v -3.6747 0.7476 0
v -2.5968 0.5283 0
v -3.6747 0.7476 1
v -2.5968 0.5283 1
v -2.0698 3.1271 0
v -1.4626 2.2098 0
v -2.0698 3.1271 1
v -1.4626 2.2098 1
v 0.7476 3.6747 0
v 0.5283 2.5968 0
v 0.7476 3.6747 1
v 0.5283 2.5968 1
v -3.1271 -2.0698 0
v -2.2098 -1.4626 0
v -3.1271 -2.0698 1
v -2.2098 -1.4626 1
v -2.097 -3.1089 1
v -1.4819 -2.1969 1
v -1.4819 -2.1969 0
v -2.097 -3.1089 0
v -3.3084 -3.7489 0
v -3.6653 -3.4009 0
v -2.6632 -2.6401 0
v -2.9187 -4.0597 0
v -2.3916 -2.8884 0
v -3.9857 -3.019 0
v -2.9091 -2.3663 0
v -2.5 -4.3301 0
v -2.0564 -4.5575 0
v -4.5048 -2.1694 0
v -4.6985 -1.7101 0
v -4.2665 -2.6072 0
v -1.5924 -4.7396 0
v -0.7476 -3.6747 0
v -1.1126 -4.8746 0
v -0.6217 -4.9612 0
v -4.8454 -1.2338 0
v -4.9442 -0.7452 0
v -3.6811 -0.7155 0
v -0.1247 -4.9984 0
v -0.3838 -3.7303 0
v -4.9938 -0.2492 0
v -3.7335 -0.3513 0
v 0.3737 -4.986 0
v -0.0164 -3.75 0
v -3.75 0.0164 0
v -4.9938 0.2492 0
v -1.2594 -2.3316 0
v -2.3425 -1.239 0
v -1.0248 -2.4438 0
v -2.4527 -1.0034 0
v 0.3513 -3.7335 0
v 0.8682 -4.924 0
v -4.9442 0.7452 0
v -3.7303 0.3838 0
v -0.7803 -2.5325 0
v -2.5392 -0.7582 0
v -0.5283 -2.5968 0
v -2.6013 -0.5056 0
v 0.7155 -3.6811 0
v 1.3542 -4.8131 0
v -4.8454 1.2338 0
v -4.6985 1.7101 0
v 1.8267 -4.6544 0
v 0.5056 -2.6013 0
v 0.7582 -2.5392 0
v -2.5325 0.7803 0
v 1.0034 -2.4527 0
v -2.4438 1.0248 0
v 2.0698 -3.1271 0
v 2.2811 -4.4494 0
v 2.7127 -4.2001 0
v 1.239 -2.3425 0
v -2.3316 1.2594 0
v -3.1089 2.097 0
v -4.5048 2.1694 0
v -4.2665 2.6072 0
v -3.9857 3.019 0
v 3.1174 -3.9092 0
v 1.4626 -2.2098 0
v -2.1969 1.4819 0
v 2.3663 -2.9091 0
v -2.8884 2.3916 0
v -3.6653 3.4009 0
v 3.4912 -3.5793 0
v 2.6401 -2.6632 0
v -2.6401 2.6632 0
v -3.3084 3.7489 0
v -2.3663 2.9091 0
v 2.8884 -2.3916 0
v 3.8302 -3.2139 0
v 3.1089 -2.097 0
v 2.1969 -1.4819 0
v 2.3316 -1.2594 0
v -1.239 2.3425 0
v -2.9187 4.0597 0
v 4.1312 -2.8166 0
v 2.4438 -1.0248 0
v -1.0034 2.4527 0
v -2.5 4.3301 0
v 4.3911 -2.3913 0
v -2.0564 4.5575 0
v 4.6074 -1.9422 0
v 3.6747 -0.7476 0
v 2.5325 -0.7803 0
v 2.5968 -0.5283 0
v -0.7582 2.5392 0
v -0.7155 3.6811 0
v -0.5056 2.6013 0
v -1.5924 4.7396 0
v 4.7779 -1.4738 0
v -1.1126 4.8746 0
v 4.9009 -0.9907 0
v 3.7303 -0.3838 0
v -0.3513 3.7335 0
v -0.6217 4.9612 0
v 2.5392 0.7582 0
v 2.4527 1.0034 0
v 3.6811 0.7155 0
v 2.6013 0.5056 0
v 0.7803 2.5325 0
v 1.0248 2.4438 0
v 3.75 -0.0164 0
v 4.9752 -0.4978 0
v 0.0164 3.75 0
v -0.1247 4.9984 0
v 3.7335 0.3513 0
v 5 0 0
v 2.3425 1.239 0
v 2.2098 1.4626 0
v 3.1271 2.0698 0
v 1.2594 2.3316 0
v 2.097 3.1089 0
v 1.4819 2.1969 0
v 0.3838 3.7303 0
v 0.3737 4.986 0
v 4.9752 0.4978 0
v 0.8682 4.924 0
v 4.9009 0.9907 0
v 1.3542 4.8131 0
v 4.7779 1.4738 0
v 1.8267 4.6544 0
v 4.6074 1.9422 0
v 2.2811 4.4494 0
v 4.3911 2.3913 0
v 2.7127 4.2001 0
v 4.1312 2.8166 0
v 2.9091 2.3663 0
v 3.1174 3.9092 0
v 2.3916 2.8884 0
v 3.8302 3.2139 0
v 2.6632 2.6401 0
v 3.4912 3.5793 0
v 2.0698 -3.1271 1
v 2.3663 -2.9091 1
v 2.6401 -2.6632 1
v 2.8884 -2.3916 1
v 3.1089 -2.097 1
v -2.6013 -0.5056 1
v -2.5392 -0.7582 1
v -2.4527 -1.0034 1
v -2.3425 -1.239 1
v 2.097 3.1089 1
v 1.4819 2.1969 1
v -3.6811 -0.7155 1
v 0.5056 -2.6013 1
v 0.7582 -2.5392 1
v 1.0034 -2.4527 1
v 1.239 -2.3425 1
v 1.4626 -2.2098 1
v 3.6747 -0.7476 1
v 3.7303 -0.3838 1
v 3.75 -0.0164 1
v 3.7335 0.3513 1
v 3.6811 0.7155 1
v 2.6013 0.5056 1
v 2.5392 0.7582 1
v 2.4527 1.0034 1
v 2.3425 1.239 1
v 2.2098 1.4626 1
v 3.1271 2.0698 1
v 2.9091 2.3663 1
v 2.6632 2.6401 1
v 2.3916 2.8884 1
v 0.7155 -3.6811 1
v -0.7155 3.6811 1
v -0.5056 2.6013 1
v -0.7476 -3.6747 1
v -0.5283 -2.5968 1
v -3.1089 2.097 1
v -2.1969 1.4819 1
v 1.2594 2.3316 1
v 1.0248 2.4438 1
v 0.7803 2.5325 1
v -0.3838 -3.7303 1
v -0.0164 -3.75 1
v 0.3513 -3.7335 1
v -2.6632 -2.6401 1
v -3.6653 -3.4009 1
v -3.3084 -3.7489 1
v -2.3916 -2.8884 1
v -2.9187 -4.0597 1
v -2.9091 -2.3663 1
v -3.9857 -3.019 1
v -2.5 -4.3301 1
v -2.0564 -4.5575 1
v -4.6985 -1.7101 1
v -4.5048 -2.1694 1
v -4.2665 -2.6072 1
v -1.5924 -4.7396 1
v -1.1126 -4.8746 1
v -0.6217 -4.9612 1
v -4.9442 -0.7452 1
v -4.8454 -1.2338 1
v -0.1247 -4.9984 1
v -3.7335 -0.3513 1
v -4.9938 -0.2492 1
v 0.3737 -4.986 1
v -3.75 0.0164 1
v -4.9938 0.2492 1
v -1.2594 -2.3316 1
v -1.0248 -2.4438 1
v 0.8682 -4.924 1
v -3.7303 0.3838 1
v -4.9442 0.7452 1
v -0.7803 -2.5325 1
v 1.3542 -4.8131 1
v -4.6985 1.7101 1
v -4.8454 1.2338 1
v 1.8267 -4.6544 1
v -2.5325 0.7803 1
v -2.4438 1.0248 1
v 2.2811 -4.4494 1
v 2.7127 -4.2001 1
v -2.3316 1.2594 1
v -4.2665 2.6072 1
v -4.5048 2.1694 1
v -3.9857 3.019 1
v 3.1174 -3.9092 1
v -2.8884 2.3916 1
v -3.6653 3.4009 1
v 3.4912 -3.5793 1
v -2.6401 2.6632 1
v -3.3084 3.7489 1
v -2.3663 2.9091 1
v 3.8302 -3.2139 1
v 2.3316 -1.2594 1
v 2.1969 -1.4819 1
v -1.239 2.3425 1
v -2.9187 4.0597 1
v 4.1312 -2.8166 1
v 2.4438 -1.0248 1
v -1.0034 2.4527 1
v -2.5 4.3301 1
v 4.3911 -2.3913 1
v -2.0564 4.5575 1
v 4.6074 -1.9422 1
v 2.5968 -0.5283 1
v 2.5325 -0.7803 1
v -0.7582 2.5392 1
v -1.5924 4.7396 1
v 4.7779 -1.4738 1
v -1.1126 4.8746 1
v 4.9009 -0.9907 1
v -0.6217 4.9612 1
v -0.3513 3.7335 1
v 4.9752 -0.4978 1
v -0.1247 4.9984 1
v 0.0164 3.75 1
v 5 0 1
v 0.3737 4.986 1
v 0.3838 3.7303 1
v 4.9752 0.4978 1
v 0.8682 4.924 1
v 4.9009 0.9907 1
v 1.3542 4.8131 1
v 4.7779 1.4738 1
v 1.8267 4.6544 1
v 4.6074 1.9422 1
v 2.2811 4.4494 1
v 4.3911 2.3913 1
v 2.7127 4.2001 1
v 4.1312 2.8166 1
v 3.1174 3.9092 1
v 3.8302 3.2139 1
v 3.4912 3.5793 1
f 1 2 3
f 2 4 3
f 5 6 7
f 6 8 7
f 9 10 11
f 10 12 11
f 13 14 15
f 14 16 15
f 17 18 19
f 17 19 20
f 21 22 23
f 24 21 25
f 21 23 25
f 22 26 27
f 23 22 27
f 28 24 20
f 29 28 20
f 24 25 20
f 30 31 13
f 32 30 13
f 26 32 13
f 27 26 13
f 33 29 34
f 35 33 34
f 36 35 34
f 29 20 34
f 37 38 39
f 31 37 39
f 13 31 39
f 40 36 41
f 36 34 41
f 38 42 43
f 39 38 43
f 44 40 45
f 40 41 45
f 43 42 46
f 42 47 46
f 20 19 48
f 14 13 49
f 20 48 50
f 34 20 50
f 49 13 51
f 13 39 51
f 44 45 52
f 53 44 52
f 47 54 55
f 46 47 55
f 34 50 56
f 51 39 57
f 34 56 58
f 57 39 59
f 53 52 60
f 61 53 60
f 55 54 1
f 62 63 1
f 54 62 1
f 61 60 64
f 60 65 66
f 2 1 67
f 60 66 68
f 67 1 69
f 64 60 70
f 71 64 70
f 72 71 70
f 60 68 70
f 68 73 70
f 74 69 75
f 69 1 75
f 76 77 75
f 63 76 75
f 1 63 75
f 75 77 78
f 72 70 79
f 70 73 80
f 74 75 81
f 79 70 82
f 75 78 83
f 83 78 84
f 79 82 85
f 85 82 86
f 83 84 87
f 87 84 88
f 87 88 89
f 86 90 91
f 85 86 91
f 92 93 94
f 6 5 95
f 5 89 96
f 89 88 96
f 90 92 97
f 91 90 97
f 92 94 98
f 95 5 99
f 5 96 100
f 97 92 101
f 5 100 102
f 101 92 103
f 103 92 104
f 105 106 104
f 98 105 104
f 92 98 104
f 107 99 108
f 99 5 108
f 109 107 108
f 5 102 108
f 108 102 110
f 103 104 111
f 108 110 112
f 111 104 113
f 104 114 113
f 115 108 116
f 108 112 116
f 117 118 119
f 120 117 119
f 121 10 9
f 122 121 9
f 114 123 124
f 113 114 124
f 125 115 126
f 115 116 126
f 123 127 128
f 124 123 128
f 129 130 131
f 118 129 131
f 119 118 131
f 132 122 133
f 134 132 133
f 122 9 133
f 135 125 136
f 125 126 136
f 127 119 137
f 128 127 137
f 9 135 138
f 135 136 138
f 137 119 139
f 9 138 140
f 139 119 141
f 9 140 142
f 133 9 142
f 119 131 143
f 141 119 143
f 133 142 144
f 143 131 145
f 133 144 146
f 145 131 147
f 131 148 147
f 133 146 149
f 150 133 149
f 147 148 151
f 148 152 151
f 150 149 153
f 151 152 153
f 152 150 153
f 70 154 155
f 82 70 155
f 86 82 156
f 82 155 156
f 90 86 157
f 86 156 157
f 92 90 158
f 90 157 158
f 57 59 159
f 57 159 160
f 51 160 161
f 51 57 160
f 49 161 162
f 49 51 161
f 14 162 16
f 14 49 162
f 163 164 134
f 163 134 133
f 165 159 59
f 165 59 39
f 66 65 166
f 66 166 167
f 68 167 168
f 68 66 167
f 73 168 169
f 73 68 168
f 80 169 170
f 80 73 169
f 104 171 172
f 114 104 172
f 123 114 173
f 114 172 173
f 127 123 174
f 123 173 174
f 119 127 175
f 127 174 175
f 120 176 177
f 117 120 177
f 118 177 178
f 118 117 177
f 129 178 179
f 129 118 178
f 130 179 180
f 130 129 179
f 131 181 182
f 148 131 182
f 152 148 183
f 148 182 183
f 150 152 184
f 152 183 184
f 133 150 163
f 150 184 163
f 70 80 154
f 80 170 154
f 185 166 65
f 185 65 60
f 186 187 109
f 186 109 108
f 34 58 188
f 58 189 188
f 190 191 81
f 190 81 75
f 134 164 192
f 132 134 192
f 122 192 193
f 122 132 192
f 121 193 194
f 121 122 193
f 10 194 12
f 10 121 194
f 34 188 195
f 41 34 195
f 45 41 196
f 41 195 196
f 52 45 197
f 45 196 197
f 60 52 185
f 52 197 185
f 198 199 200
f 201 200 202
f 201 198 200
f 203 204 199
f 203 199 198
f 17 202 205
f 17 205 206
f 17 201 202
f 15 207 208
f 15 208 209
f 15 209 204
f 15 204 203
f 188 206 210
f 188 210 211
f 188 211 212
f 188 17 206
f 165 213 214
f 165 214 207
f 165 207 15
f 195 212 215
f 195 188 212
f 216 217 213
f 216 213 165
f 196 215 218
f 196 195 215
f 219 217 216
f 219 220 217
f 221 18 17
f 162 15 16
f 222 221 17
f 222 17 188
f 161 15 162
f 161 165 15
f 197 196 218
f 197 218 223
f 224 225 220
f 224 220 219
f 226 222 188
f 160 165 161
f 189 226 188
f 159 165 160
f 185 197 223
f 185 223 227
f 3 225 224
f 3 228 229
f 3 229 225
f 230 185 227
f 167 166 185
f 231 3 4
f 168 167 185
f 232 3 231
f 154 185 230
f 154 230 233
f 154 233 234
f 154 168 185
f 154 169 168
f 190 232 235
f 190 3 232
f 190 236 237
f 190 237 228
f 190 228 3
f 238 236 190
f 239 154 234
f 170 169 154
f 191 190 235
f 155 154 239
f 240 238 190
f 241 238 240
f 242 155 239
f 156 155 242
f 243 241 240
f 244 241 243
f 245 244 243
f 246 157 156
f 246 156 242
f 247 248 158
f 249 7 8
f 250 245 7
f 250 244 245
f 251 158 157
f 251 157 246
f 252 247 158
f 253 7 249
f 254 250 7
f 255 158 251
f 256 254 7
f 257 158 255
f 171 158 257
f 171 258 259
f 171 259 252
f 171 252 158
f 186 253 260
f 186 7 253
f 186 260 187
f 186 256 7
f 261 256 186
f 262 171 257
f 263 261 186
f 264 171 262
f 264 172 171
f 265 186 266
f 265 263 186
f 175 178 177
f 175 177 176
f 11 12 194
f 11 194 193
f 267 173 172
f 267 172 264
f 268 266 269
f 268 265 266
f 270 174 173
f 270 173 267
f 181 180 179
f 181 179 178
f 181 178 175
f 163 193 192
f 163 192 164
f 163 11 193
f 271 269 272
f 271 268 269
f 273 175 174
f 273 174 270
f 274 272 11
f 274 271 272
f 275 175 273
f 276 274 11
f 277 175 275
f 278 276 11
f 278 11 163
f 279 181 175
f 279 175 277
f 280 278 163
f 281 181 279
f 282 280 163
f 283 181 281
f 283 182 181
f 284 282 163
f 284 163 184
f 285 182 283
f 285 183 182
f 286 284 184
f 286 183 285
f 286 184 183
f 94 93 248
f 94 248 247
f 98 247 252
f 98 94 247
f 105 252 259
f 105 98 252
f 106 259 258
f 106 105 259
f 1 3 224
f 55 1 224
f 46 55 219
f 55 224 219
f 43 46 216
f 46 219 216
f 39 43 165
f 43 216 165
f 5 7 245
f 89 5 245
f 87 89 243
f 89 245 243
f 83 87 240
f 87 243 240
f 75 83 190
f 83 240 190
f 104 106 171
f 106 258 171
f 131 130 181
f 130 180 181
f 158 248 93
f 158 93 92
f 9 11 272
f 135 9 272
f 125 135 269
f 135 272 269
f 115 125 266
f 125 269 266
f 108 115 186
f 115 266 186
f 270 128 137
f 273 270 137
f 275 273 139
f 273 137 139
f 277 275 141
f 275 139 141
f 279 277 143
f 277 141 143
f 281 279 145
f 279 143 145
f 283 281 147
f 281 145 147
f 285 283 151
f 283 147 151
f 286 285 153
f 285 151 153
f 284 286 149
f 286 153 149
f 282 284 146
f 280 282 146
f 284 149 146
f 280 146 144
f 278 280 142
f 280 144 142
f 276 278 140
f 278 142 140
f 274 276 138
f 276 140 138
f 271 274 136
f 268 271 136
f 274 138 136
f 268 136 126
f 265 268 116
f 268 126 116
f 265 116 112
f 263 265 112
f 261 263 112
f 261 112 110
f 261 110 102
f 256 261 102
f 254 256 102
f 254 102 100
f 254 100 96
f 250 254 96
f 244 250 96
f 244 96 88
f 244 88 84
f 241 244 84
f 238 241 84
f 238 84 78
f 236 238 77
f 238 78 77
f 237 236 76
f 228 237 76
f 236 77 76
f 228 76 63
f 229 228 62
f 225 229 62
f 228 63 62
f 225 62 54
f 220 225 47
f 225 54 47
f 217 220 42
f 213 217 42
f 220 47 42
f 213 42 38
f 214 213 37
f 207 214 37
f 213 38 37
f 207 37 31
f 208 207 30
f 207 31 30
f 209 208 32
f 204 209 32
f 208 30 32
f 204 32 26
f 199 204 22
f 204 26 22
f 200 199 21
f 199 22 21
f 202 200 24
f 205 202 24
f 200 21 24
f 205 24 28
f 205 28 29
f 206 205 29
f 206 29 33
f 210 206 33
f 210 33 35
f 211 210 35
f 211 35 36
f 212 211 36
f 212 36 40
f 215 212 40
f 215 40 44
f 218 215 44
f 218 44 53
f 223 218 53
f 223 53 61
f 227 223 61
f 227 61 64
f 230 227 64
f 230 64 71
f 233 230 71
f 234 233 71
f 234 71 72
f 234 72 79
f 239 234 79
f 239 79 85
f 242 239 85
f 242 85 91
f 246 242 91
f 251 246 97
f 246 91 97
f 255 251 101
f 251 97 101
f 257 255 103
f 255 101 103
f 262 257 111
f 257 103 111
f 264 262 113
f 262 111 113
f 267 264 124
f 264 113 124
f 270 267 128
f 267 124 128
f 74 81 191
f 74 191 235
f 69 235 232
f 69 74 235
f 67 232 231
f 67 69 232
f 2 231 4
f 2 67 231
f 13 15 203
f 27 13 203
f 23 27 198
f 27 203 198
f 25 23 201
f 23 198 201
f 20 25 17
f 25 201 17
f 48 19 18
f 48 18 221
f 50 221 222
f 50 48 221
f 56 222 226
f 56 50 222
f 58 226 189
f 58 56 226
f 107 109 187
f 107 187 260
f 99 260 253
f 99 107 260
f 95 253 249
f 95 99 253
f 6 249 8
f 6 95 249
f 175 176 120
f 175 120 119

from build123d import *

# Parameters (mm, degrees)
CYLINDER003_R          = 2
CYLINDER003_DEPTH      = 10
CYLINDER002_W          = 3.75
CYLINDER002_H          = 10
CYLINDER002_ANGLE      = 22.5
CUT001_PLACEMENT_ANGLE = -11.5
ARRAY_COUNT            = 8
CYLINDER001_R          = 2.65
CYLINDER001_DEPTH      = 2
CYLINDER_R             = 5
CYLINDER_DEPTH         = 1


with BuildPart() as vaciado_sector:
    # Cylinder003 → Cylinder003 (new body)
    with BuildSketch(Plane.XY):
        Circle(CYLINDER003_R)
    extrude(amount=CYLINDER003_DEPTH)


with BuildPart() as array_vaciado_8_sectores:
    # Cylinder002 → Cylinder002 (revolve)
    with BuildSketch(Plane.XZ):
        with Locations((1.875, 5)):
            Rectangle(CYLINDER002_W, CYLINDER002_H)
    revolve(axis=Axis((0, 0, 0), (0, 0, 1)), revolution_arc=CYLINDER002_ANGLE)

    # Cut001: cut vaciado sector
    add(vaciado_sector.part, mode=Mode.SUBTRACT)


with BuildPart() as array_vaciado_8_sectores_1:
    # Cut001 placement: moved
    add(array_vaciado_8_sectores.part.moved(Location((0, 0, -5))).rotate(Axis((0, 0, -5), (0, 0, 1)), CUT001_PLACEMENT_ANGLE))

    # Array: Array vaciado 8 sectores ×8 about axis
    array_axis = Axis((0, 0, 0), (0, 0, 1))


with BuildPart() as array_vaciado_8_sectores_2:
    add(array_vaciado_8_sectores_1.part)
    for i in range(1, ARRAY_COUNT):
        add(array_vaciado_8_sectores_1.part.rotate(array_axis, i * 360 / ARRAY_COUNT))


with BuildPart() as vaciado_interior_arandela_freno:
    # Cylinder001 → Cylinder001 (new body)
    with BuildSketch(Plane.XY.offset(-0.5)):
        Circle(CYLINDER001_R)
    extrude(amount=CYLINDER001_DEPTH)


with BuildPart() as master_arandela_de_freno:
    # Cylinder → Cylinder (new body)
    with BuildSketch(Plane.XY):
        Circle(CYLINDER_R)
    extrude(amount=CYLINDER_DEPTH)

    # Cut: cut vaciado interior arandela freno
    add(vaciado_interior_arandela_freno.part, mode=Mode.SUBTRACT)

    # Cut002: cut Array vaciado 8 sectores
    add(array_vaciado_8_sectores_2.part, mode=Mode.SUBTRACT)


solid = master_arandela_de_freno.part
